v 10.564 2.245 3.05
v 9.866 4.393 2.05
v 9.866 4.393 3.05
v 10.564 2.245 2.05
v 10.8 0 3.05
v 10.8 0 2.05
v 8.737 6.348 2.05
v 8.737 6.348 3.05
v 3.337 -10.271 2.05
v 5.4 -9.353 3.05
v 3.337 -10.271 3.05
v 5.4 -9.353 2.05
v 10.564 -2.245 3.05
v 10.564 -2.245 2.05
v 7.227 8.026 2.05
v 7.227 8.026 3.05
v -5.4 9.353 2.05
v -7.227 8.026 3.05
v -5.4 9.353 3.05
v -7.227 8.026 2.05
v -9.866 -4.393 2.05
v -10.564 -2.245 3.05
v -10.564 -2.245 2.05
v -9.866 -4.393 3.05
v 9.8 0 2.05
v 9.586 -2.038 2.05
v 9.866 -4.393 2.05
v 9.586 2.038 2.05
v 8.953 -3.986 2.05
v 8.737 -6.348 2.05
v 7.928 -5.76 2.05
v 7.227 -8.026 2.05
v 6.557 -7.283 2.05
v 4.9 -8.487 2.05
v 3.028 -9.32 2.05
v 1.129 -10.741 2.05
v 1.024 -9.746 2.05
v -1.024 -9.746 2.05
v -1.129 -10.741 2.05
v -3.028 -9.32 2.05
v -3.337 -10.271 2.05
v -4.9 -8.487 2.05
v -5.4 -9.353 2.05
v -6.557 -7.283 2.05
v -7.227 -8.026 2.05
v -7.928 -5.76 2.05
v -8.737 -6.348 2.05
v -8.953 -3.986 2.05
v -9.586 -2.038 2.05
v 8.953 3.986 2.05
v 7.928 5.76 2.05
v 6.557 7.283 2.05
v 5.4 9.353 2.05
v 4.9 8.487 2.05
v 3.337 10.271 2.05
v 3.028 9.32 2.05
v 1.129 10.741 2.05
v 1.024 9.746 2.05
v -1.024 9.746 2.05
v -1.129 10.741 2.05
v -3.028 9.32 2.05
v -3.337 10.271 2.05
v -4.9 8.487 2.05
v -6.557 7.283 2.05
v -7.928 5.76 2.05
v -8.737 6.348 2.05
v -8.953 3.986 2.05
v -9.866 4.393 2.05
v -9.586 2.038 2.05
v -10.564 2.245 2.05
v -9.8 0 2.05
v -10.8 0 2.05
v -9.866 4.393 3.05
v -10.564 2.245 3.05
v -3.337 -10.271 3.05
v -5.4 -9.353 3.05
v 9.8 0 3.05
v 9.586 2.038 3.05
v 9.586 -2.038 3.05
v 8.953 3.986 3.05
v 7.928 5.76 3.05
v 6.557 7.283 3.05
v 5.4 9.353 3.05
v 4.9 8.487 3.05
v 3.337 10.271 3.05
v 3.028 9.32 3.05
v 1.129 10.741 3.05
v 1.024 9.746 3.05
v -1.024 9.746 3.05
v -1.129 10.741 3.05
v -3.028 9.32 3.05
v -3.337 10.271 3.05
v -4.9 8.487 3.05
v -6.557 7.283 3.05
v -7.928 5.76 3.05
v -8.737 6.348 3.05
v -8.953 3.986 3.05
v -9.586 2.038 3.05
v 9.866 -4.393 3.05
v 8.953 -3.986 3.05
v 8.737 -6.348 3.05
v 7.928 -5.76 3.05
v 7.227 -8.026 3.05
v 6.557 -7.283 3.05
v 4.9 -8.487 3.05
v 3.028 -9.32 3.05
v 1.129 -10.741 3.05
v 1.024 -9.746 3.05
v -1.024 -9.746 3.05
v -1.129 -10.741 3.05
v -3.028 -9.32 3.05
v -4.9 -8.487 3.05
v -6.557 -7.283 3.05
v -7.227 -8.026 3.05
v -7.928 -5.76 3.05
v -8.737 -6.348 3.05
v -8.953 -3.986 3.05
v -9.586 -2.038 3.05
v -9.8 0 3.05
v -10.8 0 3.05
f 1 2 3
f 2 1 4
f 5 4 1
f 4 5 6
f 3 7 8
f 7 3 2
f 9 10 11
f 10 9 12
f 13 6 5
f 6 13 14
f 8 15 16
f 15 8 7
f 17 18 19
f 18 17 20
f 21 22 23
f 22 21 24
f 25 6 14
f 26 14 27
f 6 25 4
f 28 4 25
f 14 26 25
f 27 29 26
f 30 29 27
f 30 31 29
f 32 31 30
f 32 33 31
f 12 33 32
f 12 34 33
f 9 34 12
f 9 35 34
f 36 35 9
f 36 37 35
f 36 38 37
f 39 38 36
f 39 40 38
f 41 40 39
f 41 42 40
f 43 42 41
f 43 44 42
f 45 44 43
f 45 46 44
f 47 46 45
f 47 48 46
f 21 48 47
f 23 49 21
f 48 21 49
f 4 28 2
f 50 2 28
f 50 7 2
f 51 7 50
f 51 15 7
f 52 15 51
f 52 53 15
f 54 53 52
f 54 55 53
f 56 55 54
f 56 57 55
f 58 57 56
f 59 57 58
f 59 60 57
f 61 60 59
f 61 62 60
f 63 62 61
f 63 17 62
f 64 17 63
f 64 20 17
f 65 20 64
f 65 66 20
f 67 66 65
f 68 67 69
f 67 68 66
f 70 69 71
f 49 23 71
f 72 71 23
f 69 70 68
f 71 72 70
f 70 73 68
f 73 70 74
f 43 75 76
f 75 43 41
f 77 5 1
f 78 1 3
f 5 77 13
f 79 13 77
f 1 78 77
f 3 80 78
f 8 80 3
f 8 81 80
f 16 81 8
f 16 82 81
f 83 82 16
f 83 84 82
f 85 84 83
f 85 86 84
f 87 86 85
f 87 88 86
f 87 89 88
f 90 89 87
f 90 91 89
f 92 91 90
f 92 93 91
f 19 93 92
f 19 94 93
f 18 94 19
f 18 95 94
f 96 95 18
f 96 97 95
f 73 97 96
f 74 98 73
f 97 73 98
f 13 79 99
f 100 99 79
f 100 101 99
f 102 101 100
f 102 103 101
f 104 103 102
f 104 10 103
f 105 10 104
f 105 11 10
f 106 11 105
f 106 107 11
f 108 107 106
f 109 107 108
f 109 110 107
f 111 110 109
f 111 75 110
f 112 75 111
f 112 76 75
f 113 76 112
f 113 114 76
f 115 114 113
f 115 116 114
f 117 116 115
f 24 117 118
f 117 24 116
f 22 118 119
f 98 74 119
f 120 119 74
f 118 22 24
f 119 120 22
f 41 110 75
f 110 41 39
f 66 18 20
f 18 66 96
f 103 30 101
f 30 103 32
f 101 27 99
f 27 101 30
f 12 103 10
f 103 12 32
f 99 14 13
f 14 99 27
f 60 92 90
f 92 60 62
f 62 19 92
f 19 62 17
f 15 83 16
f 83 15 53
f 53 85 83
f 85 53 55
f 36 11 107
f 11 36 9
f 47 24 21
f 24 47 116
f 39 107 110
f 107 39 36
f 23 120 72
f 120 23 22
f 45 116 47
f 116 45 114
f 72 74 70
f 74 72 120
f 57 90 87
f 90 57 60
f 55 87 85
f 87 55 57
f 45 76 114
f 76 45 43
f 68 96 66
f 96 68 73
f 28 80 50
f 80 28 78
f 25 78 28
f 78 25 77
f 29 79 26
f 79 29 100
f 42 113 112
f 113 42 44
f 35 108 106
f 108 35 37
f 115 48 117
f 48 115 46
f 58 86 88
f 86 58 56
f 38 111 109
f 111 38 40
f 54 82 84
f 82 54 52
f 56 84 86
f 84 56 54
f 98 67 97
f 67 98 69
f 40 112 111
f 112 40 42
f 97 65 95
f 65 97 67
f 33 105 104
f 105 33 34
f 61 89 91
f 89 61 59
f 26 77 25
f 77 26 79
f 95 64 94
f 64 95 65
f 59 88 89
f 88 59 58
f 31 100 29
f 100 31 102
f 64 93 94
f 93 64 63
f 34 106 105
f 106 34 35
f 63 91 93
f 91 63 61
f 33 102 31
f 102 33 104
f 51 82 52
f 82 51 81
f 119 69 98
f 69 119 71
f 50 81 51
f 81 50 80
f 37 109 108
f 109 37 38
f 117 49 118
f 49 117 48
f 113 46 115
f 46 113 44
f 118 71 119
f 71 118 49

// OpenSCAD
// Parameters
r_outer = 10.8; //[5.4:21.6:0.1]
r_inner = 10.8; //[0:21.6:0.1]
H = 5.3; //[2.65:10.6:0.1]
t = 1; //[0.5:2:0.1]
overlap = 0.8; //[0.5:2:0.1]

// Geometry
module radial_body_outer() {
  cylinder(h=H, r=r_outer, center=true);
}

module radial_body_inner_cut() {
  cylinder(h=H, r=r_inner, center=true);
}

module thickness_feature_outer() {
  translate([0, 0, H/2 - t/2 + overlap/2])
    cylinder(h=t, r=r_outer, center=true);
}

module thickness_feature_inner_cut() {
  translate([0, 0, H/2 - t/2 + overlap/2])
    cylinder(h=t + overlap, r=r_outer - t, center=true);
}

// Operations
module radial_body() {
  difference() {
    radial_body_outer();
    radial_body_inner_cut();
  }
}

module thickness_feature() {
  difference() {
    thickness_feature_outer();
    thickness_feature_inner_cut();
  }
}

// Final Model
module complete_model() {
  union() {
    radial_body();
    thickness_feature();
  }
}

// Render the complete model
complete_model();
